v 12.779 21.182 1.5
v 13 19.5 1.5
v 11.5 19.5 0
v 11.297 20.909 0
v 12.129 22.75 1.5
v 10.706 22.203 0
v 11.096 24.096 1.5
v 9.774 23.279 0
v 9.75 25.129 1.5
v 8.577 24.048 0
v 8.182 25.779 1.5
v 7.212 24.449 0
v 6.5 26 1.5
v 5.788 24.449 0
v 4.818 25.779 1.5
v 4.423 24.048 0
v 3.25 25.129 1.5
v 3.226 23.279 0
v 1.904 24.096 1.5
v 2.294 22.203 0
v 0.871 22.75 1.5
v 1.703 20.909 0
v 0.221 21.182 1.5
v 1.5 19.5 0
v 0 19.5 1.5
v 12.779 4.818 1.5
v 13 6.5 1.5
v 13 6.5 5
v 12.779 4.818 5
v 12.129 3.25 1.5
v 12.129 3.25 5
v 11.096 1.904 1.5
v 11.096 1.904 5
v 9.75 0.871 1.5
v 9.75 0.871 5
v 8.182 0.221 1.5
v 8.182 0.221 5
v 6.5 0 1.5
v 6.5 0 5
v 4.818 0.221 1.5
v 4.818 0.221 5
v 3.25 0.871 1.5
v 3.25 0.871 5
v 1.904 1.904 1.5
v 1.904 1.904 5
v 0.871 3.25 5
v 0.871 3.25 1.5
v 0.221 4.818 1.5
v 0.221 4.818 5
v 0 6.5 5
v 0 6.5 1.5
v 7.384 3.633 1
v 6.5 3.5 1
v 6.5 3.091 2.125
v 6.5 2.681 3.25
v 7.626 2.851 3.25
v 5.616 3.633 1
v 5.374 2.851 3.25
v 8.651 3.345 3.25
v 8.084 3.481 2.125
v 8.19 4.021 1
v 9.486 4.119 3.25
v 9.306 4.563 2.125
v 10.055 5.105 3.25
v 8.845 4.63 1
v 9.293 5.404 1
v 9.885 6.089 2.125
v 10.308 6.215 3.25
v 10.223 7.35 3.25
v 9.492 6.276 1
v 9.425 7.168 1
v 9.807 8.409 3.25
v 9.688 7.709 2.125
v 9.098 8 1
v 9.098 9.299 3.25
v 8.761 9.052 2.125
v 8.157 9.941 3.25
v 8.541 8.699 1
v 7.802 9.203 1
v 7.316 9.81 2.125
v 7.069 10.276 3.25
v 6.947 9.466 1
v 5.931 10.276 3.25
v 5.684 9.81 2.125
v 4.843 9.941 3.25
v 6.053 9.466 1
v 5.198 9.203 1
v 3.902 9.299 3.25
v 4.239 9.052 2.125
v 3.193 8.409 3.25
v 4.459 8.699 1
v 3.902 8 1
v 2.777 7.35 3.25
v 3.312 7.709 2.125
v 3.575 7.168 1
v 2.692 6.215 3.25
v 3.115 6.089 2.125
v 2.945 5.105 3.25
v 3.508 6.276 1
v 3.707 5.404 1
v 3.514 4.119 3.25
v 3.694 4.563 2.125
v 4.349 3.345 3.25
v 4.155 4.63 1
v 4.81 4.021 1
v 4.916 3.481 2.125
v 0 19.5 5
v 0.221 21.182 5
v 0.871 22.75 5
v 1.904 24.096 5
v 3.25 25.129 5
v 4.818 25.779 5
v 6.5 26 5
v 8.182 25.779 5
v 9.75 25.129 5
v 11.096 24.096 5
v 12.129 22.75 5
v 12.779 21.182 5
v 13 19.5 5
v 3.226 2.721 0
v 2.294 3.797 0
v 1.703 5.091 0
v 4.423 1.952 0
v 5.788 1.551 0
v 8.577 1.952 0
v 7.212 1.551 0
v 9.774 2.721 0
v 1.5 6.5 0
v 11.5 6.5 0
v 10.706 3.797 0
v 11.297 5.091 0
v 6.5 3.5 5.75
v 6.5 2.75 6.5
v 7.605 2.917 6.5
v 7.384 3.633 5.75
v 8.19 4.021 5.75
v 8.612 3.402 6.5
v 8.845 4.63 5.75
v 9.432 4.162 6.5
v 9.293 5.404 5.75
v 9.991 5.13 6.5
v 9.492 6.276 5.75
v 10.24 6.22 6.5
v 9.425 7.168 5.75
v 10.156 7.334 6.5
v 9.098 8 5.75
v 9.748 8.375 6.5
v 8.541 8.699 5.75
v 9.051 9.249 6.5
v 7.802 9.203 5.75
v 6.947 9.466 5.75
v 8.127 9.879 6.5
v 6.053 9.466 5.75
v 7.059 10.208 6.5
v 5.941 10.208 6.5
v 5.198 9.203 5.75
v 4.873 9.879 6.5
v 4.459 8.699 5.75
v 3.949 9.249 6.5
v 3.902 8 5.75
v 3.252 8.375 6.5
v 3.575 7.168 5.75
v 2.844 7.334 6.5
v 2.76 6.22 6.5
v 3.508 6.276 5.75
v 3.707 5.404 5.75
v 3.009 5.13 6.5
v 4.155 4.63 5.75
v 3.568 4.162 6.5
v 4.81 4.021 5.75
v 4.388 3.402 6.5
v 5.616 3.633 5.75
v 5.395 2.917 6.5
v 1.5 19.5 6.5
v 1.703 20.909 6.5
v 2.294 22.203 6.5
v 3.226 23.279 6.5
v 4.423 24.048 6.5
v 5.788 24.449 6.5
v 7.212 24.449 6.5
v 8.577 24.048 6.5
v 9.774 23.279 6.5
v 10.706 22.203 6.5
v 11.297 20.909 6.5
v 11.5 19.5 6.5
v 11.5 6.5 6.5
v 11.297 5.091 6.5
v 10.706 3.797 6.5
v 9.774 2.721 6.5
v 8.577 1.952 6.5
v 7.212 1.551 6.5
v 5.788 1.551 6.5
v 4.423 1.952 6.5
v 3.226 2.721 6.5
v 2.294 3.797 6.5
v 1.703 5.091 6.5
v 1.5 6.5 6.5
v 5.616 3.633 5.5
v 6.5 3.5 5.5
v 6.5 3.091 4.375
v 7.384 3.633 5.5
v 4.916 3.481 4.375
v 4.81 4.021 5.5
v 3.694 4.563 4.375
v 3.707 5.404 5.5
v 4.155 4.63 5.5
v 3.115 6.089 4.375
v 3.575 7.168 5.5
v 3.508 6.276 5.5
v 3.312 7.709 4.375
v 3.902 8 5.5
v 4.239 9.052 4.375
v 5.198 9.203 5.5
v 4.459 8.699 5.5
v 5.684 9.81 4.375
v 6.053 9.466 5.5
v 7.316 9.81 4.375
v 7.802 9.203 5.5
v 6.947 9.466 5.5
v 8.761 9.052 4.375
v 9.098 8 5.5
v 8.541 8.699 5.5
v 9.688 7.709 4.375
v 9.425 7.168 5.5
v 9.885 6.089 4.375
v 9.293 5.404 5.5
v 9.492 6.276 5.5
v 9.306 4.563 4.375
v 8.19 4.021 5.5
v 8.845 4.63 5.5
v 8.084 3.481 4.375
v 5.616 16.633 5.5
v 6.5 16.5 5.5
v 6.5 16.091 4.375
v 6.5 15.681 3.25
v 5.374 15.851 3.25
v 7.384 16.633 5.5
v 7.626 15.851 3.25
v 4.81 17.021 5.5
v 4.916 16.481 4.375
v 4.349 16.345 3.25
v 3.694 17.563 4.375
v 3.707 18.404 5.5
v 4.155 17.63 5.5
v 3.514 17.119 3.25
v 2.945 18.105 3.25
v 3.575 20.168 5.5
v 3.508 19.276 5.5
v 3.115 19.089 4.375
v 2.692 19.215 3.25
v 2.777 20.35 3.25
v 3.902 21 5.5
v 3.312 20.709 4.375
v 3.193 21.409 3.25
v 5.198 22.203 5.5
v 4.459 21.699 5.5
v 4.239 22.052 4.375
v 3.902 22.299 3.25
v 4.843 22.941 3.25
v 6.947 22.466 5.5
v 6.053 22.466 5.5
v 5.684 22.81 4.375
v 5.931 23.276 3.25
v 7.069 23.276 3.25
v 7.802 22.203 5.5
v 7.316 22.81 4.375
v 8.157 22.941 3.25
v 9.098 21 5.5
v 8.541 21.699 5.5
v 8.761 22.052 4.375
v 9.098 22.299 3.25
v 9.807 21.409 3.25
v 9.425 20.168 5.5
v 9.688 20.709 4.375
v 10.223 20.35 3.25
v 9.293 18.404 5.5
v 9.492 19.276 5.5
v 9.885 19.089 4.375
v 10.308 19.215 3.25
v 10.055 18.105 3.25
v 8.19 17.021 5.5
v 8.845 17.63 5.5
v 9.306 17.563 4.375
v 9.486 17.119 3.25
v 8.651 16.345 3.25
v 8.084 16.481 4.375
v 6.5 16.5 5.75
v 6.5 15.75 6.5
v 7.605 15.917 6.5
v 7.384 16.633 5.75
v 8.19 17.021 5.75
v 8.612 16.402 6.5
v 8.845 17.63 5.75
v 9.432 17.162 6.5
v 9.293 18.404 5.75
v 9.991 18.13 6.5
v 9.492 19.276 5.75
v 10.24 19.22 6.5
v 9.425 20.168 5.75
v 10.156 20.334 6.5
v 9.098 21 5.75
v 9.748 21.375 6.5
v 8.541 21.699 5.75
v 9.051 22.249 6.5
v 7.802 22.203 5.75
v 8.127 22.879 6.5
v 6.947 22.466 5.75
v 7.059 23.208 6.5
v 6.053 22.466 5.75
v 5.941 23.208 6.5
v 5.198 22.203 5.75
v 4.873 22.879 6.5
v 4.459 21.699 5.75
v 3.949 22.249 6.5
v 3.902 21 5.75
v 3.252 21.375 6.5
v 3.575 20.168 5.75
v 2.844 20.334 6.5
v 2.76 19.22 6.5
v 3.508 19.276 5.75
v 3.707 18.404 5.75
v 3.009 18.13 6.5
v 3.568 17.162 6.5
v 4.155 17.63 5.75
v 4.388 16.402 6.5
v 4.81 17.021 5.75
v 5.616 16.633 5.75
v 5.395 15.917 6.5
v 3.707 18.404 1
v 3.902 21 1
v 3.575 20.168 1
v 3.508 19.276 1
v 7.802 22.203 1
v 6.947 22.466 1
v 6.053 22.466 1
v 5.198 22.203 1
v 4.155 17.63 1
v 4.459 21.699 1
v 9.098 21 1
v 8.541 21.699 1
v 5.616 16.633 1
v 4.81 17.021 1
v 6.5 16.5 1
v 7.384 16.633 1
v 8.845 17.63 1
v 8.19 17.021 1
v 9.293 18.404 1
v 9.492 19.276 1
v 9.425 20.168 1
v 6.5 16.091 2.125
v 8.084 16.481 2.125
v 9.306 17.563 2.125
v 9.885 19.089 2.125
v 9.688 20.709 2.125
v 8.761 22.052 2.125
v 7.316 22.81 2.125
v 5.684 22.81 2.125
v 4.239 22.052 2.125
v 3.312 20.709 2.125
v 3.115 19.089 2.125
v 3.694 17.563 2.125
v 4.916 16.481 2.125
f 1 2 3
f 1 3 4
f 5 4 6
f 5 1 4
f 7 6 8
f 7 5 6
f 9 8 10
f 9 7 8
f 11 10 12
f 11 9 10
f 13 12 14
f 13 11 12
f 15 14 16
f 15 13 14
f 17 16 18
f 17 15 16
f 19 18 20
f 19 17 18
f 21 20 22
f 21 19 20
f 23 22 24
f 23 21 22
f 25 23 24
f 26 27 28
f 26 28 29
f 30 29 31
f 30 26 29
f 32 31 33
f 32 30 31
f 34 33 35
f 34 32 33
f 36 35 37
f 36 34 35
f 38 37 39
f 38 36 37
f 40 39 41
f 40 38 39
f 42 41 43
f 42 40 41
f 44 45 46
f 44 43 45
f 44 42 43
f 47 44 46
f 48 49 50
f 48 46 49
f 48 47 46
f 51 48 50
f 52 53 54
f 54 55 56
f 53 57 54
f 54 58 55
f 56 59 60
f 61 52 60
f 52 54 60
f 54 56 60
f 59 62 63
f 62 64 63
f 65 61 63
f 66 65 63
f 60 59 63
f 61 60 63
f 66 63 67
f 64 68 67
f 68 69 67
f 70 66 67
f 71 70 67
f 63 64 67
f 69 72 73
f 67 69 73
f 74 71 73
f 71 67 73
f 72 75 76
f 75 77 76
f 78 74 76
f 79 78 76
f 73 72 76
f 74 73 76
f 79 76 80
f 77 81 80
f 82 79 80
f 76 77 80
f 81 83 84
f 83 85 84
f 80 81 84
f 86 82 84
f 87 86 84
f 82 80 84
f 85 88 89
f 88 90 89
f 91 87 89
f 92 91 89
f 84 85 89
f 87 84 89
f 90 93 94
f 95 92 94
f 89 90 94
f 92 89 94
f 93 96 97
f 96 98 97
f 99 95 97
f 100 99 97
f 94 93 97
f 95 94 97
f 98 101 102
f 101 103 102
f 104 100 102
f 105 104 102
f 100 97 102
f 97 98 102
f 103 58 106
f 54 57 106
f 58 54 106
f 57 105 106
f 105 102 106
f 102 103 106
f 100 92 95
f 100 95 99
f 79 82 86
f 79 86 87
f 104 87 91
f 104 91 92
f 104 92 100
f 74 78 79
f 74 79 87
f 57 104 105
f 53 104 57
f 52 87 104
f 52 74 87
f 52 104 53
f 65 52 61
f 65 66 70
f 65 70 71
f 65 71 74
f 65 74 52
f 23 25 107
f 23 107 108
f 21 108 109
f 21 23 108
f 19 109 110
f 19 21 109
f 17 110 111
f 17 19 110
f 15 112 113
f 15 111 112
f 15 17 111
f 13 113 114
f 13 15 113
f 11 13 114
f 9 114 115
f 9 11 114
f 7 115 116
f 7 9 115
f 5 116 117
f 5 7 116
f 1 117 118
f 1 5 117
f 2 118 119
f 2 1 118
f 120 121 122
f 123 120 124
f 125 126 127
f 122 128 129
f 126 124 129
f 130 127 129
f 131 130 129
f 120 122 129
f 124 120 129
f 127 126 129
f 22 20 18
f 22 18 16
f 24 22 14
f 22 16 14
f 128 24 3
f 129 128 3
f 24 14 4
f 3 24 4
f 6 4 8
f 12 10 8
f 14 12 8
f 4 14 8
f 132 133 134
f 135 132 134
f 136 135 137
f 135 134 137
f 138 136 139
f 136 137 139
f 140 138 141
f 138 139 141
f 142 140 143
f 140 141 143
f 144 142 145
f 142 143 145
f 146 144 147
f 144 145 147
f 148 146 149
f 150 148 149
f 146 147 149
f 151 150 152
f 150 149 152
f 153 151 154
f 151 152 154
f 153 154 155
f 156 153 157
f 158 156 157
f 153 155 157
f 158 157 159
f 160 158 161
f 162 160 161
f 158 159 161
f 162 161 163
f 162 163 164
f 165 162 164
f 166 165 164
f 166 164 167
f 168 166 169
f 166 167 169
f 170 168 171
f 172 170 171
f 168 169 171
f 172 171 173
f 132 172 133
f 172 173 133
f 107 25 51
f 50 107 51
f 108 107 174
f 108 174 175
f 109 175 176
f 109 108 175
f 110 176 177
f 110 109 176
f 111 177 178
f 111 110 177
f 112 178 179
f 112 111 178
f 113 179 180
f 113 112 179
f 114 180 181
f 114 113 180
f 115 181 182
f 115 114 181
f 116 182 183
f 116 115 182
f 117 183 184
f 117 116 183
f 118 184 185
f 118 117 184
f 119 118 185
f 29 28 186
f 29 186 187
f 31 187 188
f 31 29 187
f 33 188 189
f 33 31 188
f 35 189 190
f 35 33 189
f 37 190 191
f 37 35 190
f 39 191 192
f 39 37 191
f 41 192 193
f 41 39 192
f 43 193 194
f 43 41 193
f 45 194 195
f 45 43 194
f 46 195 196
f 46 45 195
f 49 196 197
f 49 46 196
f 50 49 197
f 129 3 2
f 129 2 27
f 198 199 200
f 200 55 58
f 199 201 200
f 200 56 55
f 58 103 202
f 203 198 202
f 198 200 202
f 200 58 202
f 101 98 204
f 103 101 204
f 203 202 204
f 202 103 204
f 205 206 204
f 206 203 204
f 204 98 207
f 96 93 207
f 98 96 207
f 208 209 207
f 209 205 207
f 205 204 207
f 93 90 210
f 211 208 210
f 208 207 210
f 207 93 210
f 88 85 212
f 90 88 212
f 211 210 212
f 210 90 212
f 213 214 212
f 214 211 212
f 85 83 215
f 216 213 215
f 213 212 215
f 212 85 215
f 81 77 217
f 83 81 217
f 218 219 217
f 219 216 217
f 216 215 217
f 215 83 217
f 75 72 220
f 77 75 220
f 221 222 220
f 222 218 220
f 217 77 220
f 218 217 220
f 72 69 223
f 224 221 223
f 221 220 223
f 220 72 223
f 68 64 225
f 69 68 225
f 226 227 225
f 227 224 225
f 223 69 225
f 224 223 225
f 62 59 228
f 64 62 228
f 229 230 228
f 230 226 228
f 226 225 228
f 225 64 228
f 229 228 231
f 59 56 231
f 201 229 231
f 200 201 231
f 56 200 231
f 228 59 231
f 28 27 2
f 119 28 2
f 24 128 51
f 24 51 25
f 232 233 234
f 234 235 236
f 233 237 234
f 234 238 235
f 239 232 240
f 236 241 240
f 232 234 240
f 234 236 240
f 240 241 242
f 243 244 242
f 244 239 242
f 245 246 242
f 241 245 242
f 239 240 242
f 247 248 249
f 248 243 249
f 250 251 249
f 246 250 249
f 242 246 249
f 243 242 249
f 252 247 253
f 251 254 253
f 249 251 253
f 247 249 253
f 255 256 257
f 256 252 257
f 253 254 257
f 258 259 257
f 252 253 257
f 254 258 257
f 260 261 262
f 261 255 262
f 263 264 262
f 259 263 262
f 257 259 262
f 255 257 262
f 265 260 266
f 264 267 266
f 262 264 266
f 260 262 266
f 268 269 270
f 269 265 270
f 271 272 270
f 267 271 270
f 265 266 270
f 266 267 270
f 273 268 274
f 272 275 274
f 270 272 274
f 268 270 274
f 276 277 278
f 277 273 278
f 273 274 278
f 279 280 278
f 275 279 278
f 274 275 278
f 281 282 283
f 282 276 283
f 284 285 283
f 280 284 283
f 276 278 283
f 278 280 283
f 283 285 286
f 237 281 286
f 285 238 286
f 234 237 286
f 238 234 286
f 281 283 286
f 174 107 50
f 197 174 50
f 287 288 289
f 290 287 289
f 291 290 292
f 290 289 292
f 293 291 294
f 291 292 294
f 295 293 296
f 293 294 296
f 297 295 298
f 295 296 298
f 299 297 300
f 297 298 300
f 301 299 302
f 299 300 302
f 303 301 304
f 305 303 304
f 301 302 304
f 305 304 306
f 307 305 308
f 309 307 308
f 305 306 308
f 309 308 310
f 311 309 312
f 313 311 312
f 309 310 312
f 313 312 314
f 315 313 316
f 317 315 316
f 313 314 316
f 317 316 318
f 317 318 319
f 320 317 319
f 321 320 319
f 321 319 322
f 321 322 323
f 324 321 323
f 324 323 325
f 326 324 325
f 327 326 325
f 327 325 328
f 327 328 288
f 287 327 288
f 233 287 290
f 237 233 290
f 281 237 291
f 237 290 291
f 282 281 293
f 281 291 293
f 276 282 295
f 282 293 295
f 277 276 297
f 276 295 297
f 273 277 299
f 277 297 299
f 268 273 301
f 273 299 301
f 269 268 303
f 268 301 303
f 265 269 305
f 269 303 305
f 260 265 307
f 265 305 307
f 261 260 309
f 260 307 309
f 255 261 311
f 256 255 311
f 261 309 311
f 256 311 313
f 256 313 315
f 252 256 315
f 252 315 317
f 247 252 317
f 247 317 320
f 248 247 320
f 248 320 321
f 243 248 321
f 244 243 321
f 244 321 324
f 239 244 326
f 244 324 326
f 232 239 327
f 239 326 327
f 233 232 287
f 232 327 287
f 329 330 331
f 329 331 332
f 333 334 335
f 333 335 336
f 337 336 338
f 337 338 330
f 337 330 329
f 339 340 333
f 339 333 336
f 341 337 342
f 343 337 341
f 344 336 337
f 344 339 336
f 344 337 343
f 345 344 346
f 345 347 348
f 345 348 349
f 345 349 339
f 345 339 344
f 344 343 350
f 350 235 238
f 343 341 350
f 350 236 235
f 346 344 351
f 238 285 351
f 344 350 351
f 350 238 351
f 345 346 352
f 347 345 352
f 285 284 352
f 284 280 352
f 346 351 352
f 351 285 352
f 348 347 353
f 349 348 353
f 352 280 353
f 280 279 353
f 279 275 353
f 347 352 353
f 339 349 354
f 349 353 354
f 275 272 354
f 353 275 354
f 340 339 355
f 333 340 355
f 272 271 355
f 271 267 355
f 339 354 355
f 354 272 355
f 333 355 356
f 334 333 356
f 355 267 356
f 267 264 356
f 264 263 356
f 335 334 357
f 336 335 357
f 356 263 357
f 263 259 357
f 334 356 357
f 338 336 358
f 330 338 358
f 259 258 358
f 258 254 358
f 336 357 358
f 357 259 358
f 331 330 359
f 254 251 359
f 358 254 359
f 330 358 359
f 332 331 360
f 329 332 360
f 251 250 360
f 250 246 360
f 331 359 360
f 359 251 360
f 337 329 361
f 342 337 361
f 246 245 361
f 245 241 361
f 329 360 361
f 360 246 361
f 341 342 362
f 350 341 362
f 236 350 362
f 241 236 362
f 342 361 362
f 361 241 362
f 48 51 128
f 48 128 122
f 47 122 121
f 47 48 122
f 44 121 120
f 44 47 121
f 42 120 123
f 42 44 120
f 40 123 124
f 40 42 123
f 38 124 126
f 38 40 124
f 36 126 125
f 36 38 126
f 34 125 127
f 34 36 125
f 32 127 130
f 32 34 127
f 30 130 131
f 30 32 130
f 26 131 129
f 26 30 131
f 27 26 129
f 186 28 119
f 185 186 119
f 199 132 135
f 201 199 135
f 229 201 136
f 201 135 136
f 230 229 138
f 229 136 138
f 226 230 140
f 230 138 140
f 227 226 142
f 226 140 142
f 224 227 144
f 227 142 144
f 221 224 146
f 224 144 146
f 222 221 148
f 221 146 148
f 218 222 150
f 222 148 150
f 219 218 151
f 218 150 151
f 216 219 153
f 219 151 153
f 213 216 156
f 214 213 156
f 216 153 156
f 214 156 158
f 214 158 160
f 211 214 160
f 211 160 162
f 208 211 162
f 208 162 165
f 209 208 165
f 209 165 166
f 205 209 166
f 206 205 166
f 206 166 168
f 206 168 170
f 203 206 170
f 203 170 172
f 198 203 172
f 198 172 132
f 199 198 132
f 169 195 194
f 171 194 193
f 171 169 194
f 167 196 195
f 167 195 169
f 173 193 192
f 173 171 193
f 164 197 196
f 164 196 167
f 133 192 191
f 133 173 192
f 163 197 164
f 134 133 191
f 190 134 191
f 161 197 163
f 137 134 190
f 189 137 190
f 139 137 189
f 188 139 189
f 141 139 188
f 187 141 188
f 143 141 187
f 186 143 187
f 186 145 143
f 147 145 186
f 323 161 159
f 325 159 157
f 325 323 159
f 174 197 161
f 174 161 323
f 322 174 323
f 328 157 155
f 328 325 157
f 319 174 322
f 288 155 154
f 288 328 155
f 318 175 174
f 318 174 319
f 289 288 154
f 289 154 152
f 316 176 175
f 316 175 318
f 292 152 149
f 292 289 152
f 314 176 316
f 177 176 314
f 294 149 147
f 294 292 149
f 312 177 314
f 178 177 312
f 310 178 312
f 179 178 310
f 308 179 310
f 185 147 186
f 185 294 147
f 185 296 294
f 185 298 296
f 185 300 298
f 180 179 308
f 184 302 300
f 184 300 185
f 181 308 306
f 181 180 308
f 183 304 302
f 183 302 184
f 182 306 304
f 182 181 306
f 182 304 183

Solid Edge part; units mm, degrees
sketch "Sketch1" plane through (0, 0, 0) normal (0, 0, 1) x (1, 0, 0)
  line L0 (0, 19.5) -> (0, 6.5)
  line L1 (13, 6.5) -> (13, 19.5)
  arc A0 (13, 6.5) -> (0, 6.5) centre (6.5, 6.5) cw
  arc A1 (0, 19.5) -> (13, 19.5) centre (6.5, 19.5) cw
extrude "Protrusion1" add sketch "Sketch1" along normal blind 6.5
sketch "Sketch2" plane through (6.5, 0, 0) normal (1, 0, 0) x (0, 1, 0)
  line L0 (3.5, 5.5) -> (3.5, 6.5)
  line L1 (3.5, 6.5) -> (6.5, 6.5)
  line L2 (6.5, 1) -> (6.5, 6.5)
  line L3 (3.5, 1) -> (6.5, 1)
  line L4 (3.5, 1) -> (2.6811, 3.25)
  line L5 (3.5, 5.5) -> (2.6811, 3.25)
revolve "RevolvedCutout1" cut sketch "Sketch2" angle 360 about axis through (6.5, 6.5, 1) along (0, 0, 1)
chamfer "Chaflán_38" distance 0.75 angle 45 1 edges at (6.5, 3.5, 6.5)
pattern_linear "Pattern1" count 2 spacing 13 along (0, 1, 0) of "RevolvedCutout1", "Chaflán_38"
chamfer "Chaflán_39" distance 1.5 angle 45 8 edges at (13, 13, 6.5) (6.5, 0, 6.5) (0, 13, 6.5) (6.5, 26, 6.5) (13, 13, 0) (6.5, 0, 0) (0, 13, 0) (6.5, 26, 0)
